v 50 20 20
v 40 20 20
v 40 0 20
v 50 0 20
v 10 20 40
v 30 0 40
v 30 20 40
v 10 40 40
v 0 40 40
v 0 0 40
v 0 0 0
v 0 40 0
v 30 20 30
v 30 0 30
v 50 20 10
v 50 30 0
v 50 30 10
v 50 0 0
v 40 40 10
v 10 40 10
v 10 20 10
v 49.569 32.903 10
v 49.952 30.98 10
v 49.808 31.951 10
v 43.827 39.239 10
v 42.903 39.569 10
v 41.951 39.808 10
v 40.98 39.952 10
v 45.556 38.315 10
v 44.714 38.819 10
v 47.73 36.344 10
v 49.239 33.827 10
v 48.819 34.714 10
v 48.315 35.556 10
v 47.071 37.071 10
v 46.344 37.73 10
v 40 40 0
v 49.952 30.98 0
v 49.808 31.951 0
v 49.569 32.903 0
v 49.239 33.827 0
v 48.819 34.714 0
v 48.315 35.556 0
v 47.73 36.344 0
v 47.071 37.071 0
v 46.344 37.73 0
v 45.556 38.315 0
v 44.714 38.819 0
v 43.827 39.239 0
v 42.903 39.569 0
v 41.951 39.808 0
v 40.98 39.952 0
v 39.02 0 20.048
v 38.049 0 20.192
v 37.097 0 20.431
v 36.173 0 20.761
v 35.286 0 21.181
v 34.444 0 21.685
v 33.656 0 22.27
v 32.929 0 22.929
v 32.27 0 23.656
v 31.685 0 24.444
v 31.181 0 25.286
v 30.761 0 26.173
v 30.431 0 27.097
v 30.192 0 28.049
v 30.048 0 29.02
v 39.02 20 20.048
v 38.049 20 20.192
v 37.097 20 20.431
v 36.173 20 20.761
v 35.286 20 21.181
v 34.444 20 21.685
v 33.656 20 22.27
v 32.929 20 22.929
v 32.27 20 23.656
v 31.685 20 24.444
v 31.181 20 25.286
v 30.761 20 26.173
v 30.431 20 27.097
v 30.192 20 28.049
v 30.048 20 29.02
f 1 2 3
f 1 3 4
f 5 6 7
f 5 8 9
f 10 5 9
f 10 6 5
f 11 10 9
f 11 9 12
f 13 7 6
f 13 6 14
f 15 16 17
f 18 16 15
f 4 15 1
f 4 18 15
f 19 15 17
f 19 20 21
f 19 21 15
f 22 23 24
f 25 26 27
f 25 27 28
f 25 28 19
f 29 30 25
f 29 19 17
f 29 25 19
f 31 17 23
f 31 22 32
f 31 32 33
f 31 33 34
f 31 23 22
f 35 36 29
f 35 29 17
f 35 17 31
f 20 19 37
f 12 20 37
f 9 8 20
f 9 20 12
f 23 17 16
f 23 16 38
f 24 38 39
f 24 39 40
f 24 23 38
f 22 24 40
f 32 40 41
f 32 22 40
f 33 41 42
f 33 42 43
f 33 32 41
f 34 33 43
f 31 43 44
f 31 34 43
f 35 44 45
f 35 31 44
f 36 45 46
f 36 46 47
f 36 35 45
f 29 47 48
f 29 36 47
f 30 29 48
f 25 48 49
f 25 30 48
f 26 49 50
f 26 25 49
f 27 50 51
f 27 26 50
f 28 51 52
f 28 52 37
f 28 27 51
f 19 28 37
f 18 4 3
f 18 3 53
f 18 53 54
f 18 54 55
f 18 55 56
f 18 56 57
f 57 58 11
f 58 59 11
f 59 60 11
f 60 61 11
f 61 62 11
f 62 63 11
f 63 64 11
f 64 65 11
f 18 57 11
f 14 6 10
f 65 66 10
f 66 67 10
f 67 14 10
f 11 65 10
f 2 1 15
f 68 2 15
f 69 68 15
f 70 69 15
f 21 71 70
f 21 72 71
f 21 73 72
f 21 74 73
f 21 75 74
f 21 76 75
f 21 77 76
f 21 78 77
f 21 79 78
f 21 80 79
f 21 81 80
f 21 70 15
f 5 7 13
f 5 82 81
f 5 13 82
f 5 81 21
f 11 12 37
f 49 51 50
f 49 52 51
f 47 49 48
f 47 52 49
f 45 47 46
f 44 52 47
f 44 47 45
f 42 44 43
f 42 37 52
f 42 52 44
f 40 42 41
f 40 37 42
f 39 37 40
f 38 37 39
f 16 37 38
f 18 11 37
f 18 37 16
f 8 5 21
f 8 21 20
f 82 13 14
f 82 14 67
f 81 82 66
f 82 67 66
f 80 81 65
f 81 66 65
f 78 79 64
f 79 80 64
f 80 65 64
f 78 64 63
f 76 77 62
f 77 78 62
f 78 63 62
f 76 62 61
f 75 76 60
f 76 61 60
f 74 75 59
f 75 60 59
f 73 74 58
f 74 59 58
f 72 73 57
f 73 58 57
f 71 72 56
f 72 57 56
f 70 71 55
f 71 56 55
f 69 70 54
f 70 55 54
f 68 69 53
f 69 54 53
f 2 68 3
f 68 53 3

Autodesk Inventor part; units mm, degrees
ref_plane "YZ Plane" through (0, 0, 0) normal (1, 0, 0) x (0, 1, 0)
ref_plane "XZ Plane" through (0, 0, 0) normal (0, 1, 0) x (-1, 0, 0)
ref_plane "XY Plane" through (0, 0, 0) normal (0, 0, 1) x (1, 0, 0)
sketch "草圖1" plane through (0, 0, 0) normal (0, 1, 0) x (-1, 0, 0)
  line L0 (0, 0) -> (-50, 0)
  line L1 (-50, 0) -> (-50, 40)
  line L2 (-50, 40) -> (0, 40)
  line L3 (0, 40) -> (0, 0)
  dimension "d0" = 50
  dimension "d2" = 40
extrude "擠出1" add sketch "草圖1" along normal blind 40
sketch "草圖2" plane through (0, 0, 40) normal (0, 0, 1) x (1, 0, 0)
  line L0 (50, 40) -> (50, 0) projected
  line L1 (50, 0) -> (0, 0) projected
  line L2 (0, 0) -> (0, 40) projected
  line L3 (0, 40) -> (50, 40) projected
  line L4 (10, 59.2755) -> (53.3243, 59.2755)
  line L5 (53.3243, 59.2755) -> (53.3243, 20)
  line L6 (53.3243, 20) -> (10, 20)
  line L7 (10, 20) -> (10, 59.2755)
  dimension "d5" = 10
  dimension "d6" = 20
extrude "擠出2" cut sketch "草圖2" against normal blind 30 contours L3 L7 L4 L5 L6 L0 | L0 L6 L7 L3
sketch "草圖3" plane through (10, 20, 40) normal (0, 1, 0) x (1, 0, 0)
  line L0 (40, 30) -> (0, 30) projected
  line L1 (0, 30) -> (0, 0) projected
  line L2 (40, 0) -> (0, 0) projected
  line L3 (40, 30) -> (40, 0) projected
  line L4 (40, 40) -> (40, 30) projected
  line L5 (-10, 40) -> (40, 40) projected
  line L6 (-10, 0) -> (-10, 40) projected
  line L7 (0, 0) -> (-10, 0) projected
  line L8 (-10, 0) -> (40, 0) projected
  line L9 (40, 0) -> (20, 0)
  line L10 (20, 0) -> (20, 20)
  line L11 (20, 20) -> (40, 20)
  line L12 (40, 20) -> (40, 0)
  point P0 (20, 0)
  dimension "d9" = 20
  dimension "d10" = 20
extrude "擠出3" cut sketch "草圖3" against normal through all contours L3 L2 L10 L11
fillet "圓角1" radius 10 1 edges at (30, 10, 20)
fillet "圓角2" radius 10 1 edges at (50, 40, 5)
properties part number "36" material "鋼、碳鋼"
